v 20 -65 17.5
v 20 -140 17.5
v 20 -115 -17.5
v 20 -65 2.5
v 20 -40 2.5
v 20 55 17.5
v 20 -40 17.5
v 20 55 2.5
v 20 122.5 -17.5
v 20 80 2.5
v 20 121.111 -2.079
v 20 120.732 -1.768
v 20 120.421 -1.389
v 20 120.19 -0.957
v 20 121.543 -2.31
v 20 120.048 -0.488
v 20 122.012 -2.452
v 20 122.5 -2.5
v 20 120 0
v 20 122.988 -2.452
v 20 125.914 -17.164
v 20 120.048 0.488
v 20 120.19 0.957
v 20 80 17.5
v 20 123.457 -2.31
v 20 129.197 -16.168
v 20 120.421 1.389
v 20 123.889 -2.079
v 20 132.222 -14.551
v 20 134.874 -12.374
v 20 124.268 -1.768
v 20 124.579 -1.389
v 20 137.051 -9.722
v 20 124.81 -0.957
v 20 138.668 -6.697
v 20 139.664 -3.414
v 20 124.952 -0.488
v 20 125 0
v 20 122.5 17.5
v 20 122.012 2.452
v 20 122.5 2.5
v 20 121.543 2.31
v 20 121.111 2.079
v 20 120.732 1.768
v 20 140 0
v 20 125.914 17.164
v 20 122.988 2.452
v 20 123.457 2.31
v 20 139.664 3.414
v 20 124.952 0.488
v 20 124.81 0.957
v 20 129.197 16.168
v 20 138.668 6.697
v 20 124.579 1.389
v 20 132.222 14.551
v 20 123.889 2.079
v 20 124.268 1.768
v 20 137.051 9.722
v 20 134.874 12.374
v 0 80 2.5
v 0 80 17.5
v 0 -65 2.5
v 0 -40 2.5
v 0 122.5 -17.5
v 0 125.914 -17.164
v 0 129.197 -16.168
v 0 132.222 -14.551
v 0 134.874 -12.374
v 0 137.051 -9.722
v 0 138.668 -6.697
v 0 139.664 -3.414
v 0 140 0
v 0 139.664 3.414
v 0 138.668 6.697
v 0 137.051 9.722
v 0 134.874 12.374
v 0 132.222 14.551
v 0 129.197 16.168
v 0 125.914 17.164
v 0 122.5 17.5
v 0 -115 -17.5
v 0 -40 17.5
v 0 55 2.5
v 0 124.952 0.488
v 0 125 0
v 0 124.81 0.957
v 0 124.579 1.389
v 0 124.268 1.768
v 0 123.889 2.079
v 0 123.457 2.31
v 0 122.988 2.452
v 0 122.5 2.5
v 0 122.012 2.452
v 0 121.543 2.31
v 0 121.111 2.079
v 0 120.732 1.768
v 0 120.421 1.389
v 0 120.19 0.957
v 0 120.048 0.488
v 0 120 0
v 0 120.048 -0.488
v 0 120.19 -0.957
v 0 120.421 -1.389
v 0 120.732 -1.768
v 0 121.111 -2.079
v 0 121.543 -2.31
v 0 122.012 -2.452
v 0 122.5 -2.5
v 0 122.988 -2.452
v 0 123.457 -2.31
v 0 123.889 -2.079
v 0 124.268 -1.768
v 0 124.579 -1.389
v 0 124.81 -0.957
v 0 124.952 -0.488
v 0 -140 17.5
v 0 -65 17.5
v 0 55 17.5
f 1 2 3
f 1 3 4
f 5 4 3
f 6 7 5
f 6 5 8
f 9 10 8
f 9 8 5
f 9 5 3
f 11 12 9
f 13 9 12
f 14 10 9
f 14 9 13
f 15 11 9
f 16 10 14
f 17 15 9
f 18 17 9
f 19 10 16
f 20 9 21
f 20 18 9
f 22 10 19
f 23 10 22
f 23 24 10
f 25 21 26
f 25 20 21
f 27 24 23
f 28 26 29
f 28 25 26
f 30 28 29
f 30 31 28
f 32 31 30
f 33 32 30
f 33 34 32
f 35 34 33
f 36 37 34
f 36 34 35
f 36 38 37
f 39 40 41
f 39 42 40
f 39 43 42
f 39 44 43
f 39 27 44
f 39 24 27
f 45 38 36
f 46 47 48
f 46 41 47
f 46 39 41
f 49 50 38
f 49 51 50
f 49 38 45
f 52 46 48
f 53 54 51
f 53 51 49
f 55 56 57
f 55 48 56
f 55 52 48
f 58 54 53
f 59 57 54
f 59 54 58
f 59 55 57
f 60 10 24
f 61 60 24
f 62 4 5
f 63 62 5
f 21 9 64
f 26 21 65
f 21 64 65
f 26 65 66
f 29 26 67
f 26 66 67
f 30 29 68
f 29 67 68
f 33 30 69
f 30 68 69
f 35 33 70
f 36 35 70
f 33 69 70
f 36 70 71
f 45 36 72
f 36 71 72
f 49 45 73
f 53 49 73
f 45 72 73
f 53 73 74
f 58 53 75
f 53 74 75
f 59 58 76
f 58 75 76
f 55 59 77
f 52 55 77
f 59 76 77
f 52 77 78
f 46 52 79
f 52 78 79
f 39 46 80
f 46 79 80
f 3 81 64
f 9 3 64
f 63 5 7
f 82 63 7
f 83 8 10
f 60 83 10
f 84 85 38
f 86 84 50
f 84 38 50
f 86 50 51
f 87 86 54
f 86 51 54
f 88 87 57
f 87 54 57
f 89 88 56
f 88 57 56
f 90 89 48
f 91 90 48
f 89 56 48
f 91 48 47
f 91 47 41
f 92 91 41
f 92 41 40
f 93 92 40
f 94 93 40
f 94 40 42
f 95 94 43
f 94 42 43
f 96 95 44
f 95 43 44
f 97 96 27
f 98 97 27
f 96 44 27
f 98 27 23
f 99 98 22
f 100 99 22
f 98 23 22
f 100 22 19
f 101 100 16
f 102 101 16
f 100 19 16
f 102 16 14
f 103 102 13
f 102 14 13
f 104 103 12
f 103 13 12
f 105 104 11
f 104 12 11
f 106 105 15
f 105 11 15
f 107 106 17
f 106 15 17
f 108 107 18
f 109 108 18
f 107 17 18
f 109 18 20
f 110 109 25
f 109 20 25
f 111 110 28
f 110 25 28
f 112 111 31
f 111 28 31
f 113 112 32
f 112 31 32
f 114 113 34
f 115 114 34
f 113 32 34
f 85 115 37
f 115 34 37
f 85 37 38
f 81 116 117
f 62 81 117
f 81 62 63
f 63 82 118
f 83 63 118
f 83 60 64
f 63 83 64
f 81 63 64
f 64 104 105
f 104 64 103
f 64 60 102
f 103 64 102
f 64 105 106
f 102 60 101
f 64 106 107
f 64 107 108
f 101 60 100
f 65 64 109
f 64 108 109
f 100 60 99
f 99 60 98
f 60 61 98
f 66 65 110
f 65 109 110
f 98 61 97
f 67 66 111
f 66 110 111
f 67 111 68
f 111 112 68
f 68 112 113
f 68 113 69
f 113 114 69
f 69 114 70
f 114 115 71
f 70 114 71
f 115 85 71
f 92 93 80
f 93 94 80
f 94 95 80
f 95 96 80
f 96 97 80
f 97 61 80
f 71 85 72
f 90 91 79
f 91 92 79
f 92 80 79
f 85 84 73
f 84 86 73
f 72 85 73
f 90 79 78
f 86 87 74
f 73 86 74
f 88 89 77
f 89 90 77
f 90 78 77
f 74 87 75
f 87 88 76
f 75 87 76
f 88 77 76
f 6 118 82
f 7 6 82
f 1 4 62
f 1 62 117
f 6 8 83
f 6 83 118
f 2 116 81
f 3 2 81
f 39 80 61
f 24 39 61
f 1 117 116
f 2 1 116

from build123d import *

# Parameters (mm, degrees)
F1_DEPTH = 20
F2_W     = 25
F2_H     = 15
F3_DEPTH = 20
F4_R     = 2.5
F5_DEPTH = 20


with BuildPart() as f1:
    # F0 (on Right) → F1 (new body)
    with BuildSketch(Plane.YZ):
        with BuildLine():
            ThreePointArc((122.5, -17.5), (140, 0), (122.5, 17.5))
            Line((122.5, 17.5), (-140, 17.5))
            Line((-140, 17.5), (-115, -17.5))
            Line((-115, -17.5), (122.5, -17.5))
        make_face()
    extrude(amount=F1_DEPTH)

    # F2 (on face) → F3 (cut)
    with BuildSketch(Plane.YZ.offset(20)):
        with Locations((-52.5, 10)):
            Rectangle(F2_W, F2_H)
        with Locations((67.5, 10)):
            Rectangle(F2_W, F2_H)
    extrude(amount=-F3_DEPTH, mode=Mode.SUBTRACT)

    # F4 (on face) → F5 (cut)
    with BuildSketch(Plane.YZ.offset(20)):
        with Locations((122.5, 0)):
            Circle(F4_R)
    extrude(amount=-F5_DEPTH, mode=Mode.SUBTRACT)


solid = f1.part
